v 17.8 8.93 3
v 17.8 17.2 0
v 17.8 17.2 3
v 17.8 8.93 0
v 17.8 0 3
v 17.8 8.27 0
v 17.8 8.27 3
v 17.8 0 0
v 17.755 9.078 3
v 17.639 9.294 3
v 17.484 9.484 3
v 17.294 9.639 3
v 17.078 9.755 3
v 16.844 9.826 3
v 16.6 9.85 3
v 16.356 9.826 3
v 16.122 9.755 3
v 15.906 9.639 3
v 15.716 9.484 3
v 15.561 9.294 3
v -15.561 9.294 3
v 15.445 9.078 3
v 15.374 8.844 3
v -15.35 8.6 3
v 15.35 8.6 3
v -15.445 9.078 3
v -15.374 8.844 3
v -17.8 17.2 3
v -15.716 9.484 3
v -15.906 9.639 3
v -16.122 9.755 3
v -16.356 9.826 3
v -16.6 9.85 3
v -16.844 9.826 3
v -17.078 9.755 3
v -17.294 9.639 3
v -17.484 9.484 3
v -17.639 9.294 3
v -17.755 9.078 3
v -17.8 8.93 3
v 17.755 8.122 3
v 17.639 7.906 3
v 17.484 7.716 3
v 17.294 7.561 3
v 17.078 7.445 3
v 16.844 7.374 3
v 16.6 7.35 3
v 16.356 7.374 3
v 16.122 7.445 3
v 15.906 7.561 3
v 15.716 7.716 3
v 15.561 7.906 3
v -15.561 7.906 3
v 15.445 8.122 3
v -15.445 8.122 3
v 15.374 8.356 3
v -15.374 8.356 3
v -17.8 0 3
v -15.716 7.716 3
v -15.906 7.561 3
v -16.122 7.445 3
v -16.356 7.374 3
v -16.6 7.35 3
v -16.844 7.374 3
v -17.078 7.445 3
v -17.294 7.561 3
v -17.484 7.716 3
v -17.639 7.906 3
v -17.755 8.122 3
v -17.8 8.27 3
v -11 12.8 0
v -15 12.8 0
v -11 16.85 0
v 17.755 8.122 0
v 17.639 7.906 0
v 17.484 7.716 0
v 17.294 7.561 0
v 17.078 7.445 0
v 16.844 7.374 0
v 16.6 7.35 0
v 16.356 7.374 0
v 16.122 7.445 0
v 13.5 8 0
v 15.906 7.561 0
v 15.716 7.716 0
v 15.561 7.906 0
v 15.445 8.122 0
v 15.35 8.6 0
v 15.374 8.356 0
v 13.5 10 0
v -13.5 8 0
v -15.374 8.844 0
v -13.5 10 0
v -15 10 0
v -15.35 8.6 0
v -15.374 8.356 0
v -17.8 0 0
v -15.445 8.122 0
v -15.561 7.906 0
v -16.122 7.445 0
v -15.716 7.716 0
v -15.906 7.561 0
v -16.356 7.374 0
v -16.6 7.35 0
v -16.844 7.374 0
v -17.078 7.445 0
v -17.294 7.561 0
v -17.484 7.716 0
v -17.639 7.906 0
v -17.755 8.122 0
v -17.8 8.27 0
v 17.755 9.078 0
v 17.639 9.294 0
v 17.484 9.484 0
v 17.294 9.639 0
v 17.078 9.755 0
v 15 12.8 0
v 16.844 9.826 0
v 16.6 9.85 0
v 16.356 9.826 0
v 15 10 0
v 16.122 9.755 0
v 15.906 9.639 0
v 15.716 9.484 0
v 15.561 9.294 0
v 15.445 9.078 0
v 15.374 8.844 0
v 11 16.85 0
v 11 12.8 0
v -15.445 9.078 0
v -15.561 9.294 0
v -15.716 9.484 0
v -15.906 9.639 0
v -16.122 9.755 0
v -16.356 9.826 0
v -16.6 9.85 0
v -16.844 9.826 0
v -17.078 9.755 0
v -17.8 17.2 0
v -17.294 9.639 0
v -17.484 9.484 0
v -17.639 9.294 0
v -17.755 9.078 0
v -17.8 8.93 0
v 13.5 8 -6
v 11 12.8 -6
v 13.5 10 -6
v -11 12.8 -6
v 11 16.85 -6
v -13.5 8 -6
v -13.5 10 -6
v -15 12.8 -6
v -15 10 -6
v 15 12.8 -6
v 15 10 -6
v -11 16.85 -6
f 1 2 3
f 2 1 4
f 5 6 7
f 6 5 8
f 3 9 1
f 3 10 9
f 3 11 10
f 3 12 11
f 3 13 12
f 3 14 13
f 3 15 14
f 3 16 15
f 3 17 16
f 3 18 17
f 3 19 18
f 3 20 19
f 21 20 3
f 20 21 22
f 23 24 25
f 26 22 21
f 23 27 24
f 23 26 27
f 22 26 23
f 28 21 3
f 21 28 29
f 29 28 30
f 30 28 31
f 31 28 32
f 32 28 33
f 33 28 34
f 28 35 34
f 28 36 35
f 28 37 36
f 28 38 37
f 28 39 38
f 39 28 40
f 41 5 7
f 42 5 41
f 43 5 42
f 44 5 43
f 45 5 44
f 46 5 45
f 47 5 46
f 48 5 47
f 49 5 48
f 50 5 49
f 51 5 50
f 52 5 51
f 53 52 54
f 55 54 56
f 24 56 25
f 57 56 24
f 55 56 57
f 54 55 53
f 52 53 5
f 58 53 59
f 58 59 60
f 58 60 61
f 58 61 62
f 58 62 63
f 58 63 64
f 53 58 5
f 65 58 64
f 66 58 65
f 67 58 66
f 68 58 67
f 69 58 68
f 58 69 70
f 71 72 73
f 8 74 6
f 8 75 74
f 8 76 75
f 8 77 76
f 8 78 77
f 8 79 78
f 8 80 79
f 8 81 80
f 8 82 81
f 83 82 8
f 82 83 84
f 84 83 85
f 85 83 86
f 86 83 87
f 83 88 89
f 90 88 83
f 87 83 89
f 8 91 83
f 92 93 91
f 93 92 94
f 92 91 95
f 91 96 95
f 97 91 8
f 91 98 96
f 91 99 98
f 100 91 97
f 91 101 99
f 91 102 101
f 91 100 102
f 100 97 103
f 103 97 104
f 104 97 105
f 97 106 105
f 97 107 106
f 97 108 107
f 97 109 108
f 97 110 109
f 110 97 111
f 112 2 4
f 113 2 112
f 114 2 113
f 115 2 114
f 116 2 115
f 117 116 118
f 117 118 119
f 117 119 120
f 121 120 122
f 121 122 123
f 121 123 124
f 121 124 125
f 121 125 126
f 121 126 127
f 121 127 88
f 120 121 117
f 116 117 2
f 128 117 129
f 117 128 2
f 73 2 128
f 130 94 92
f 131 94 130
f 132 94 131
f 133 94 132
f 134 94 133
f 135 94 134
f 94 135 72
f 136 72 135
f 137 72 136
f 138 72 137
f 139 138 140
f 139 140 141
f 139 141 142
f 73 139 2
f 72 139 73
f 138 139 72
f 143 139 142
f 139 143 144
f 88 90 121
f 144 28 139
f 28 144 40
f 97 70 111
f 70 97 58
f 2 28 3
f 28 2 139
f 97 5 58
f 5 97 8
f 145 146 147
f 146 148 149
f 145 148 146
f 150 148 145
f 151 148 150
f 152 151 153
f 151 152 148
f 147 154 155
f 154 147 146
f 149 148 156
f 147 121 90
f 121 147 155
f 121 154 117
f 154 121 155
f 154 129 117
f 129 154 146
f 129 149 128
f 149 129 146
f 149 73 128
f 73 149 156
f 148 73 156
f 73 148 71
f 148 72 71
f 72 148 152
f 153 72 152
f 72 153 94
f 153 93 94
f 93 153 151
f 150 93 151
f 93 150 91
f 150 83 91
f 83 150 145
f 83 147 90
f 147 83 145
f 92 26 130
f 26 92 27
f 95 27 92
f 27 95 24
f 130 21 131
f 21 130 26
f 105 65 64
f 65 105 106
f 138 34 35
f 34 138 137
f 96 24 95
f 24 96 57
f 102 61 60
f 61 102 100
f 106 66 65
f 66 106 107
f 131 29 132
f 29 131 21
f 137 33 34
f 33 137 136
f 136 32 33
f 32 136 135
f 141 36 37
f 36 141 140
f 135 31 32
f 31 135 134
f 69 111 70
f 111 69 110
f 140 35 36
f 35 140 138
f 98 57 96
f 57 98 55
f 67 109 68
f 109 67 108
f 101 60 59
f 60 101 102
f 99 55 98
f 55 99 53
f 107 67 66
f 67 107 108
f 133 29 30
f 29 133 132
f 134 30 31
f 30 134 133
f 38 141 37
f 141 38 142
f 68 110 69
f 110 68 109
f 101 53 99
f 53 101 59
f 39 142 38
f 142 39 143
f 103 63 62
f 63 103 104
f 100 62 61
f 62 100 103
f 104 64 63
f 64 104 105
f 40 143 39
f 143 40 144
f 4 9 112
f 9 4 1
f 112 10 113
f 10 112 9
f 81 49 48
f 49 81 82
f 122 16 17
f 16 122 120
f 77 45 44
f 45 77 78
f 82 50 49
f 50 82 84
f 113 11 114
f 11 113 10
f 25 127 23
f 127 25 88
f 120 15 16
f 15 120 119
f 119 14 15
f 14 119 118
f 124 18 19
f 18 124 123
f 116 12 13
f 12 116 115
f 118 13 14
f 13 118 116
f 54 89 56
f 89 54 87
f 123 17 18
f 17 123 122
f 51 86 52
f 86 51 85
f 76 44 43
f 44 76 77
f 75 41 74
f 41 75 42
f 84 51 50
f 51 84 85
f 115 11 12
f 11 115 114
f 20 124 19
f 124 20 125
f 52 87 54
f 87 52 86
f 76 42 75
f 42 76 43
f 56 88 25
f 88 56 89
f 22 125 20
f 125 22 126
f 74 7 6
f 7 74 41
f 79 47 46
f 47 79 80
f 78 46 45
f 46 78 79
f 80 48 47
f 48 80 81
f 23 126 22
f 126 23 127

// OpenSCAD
// Render target: the 3D-printed end cap (flange + retention plug).
//   openscad -o ../stl/end_cap.stl end_cap.scad
include <enclosure.scad>
end_cap();
